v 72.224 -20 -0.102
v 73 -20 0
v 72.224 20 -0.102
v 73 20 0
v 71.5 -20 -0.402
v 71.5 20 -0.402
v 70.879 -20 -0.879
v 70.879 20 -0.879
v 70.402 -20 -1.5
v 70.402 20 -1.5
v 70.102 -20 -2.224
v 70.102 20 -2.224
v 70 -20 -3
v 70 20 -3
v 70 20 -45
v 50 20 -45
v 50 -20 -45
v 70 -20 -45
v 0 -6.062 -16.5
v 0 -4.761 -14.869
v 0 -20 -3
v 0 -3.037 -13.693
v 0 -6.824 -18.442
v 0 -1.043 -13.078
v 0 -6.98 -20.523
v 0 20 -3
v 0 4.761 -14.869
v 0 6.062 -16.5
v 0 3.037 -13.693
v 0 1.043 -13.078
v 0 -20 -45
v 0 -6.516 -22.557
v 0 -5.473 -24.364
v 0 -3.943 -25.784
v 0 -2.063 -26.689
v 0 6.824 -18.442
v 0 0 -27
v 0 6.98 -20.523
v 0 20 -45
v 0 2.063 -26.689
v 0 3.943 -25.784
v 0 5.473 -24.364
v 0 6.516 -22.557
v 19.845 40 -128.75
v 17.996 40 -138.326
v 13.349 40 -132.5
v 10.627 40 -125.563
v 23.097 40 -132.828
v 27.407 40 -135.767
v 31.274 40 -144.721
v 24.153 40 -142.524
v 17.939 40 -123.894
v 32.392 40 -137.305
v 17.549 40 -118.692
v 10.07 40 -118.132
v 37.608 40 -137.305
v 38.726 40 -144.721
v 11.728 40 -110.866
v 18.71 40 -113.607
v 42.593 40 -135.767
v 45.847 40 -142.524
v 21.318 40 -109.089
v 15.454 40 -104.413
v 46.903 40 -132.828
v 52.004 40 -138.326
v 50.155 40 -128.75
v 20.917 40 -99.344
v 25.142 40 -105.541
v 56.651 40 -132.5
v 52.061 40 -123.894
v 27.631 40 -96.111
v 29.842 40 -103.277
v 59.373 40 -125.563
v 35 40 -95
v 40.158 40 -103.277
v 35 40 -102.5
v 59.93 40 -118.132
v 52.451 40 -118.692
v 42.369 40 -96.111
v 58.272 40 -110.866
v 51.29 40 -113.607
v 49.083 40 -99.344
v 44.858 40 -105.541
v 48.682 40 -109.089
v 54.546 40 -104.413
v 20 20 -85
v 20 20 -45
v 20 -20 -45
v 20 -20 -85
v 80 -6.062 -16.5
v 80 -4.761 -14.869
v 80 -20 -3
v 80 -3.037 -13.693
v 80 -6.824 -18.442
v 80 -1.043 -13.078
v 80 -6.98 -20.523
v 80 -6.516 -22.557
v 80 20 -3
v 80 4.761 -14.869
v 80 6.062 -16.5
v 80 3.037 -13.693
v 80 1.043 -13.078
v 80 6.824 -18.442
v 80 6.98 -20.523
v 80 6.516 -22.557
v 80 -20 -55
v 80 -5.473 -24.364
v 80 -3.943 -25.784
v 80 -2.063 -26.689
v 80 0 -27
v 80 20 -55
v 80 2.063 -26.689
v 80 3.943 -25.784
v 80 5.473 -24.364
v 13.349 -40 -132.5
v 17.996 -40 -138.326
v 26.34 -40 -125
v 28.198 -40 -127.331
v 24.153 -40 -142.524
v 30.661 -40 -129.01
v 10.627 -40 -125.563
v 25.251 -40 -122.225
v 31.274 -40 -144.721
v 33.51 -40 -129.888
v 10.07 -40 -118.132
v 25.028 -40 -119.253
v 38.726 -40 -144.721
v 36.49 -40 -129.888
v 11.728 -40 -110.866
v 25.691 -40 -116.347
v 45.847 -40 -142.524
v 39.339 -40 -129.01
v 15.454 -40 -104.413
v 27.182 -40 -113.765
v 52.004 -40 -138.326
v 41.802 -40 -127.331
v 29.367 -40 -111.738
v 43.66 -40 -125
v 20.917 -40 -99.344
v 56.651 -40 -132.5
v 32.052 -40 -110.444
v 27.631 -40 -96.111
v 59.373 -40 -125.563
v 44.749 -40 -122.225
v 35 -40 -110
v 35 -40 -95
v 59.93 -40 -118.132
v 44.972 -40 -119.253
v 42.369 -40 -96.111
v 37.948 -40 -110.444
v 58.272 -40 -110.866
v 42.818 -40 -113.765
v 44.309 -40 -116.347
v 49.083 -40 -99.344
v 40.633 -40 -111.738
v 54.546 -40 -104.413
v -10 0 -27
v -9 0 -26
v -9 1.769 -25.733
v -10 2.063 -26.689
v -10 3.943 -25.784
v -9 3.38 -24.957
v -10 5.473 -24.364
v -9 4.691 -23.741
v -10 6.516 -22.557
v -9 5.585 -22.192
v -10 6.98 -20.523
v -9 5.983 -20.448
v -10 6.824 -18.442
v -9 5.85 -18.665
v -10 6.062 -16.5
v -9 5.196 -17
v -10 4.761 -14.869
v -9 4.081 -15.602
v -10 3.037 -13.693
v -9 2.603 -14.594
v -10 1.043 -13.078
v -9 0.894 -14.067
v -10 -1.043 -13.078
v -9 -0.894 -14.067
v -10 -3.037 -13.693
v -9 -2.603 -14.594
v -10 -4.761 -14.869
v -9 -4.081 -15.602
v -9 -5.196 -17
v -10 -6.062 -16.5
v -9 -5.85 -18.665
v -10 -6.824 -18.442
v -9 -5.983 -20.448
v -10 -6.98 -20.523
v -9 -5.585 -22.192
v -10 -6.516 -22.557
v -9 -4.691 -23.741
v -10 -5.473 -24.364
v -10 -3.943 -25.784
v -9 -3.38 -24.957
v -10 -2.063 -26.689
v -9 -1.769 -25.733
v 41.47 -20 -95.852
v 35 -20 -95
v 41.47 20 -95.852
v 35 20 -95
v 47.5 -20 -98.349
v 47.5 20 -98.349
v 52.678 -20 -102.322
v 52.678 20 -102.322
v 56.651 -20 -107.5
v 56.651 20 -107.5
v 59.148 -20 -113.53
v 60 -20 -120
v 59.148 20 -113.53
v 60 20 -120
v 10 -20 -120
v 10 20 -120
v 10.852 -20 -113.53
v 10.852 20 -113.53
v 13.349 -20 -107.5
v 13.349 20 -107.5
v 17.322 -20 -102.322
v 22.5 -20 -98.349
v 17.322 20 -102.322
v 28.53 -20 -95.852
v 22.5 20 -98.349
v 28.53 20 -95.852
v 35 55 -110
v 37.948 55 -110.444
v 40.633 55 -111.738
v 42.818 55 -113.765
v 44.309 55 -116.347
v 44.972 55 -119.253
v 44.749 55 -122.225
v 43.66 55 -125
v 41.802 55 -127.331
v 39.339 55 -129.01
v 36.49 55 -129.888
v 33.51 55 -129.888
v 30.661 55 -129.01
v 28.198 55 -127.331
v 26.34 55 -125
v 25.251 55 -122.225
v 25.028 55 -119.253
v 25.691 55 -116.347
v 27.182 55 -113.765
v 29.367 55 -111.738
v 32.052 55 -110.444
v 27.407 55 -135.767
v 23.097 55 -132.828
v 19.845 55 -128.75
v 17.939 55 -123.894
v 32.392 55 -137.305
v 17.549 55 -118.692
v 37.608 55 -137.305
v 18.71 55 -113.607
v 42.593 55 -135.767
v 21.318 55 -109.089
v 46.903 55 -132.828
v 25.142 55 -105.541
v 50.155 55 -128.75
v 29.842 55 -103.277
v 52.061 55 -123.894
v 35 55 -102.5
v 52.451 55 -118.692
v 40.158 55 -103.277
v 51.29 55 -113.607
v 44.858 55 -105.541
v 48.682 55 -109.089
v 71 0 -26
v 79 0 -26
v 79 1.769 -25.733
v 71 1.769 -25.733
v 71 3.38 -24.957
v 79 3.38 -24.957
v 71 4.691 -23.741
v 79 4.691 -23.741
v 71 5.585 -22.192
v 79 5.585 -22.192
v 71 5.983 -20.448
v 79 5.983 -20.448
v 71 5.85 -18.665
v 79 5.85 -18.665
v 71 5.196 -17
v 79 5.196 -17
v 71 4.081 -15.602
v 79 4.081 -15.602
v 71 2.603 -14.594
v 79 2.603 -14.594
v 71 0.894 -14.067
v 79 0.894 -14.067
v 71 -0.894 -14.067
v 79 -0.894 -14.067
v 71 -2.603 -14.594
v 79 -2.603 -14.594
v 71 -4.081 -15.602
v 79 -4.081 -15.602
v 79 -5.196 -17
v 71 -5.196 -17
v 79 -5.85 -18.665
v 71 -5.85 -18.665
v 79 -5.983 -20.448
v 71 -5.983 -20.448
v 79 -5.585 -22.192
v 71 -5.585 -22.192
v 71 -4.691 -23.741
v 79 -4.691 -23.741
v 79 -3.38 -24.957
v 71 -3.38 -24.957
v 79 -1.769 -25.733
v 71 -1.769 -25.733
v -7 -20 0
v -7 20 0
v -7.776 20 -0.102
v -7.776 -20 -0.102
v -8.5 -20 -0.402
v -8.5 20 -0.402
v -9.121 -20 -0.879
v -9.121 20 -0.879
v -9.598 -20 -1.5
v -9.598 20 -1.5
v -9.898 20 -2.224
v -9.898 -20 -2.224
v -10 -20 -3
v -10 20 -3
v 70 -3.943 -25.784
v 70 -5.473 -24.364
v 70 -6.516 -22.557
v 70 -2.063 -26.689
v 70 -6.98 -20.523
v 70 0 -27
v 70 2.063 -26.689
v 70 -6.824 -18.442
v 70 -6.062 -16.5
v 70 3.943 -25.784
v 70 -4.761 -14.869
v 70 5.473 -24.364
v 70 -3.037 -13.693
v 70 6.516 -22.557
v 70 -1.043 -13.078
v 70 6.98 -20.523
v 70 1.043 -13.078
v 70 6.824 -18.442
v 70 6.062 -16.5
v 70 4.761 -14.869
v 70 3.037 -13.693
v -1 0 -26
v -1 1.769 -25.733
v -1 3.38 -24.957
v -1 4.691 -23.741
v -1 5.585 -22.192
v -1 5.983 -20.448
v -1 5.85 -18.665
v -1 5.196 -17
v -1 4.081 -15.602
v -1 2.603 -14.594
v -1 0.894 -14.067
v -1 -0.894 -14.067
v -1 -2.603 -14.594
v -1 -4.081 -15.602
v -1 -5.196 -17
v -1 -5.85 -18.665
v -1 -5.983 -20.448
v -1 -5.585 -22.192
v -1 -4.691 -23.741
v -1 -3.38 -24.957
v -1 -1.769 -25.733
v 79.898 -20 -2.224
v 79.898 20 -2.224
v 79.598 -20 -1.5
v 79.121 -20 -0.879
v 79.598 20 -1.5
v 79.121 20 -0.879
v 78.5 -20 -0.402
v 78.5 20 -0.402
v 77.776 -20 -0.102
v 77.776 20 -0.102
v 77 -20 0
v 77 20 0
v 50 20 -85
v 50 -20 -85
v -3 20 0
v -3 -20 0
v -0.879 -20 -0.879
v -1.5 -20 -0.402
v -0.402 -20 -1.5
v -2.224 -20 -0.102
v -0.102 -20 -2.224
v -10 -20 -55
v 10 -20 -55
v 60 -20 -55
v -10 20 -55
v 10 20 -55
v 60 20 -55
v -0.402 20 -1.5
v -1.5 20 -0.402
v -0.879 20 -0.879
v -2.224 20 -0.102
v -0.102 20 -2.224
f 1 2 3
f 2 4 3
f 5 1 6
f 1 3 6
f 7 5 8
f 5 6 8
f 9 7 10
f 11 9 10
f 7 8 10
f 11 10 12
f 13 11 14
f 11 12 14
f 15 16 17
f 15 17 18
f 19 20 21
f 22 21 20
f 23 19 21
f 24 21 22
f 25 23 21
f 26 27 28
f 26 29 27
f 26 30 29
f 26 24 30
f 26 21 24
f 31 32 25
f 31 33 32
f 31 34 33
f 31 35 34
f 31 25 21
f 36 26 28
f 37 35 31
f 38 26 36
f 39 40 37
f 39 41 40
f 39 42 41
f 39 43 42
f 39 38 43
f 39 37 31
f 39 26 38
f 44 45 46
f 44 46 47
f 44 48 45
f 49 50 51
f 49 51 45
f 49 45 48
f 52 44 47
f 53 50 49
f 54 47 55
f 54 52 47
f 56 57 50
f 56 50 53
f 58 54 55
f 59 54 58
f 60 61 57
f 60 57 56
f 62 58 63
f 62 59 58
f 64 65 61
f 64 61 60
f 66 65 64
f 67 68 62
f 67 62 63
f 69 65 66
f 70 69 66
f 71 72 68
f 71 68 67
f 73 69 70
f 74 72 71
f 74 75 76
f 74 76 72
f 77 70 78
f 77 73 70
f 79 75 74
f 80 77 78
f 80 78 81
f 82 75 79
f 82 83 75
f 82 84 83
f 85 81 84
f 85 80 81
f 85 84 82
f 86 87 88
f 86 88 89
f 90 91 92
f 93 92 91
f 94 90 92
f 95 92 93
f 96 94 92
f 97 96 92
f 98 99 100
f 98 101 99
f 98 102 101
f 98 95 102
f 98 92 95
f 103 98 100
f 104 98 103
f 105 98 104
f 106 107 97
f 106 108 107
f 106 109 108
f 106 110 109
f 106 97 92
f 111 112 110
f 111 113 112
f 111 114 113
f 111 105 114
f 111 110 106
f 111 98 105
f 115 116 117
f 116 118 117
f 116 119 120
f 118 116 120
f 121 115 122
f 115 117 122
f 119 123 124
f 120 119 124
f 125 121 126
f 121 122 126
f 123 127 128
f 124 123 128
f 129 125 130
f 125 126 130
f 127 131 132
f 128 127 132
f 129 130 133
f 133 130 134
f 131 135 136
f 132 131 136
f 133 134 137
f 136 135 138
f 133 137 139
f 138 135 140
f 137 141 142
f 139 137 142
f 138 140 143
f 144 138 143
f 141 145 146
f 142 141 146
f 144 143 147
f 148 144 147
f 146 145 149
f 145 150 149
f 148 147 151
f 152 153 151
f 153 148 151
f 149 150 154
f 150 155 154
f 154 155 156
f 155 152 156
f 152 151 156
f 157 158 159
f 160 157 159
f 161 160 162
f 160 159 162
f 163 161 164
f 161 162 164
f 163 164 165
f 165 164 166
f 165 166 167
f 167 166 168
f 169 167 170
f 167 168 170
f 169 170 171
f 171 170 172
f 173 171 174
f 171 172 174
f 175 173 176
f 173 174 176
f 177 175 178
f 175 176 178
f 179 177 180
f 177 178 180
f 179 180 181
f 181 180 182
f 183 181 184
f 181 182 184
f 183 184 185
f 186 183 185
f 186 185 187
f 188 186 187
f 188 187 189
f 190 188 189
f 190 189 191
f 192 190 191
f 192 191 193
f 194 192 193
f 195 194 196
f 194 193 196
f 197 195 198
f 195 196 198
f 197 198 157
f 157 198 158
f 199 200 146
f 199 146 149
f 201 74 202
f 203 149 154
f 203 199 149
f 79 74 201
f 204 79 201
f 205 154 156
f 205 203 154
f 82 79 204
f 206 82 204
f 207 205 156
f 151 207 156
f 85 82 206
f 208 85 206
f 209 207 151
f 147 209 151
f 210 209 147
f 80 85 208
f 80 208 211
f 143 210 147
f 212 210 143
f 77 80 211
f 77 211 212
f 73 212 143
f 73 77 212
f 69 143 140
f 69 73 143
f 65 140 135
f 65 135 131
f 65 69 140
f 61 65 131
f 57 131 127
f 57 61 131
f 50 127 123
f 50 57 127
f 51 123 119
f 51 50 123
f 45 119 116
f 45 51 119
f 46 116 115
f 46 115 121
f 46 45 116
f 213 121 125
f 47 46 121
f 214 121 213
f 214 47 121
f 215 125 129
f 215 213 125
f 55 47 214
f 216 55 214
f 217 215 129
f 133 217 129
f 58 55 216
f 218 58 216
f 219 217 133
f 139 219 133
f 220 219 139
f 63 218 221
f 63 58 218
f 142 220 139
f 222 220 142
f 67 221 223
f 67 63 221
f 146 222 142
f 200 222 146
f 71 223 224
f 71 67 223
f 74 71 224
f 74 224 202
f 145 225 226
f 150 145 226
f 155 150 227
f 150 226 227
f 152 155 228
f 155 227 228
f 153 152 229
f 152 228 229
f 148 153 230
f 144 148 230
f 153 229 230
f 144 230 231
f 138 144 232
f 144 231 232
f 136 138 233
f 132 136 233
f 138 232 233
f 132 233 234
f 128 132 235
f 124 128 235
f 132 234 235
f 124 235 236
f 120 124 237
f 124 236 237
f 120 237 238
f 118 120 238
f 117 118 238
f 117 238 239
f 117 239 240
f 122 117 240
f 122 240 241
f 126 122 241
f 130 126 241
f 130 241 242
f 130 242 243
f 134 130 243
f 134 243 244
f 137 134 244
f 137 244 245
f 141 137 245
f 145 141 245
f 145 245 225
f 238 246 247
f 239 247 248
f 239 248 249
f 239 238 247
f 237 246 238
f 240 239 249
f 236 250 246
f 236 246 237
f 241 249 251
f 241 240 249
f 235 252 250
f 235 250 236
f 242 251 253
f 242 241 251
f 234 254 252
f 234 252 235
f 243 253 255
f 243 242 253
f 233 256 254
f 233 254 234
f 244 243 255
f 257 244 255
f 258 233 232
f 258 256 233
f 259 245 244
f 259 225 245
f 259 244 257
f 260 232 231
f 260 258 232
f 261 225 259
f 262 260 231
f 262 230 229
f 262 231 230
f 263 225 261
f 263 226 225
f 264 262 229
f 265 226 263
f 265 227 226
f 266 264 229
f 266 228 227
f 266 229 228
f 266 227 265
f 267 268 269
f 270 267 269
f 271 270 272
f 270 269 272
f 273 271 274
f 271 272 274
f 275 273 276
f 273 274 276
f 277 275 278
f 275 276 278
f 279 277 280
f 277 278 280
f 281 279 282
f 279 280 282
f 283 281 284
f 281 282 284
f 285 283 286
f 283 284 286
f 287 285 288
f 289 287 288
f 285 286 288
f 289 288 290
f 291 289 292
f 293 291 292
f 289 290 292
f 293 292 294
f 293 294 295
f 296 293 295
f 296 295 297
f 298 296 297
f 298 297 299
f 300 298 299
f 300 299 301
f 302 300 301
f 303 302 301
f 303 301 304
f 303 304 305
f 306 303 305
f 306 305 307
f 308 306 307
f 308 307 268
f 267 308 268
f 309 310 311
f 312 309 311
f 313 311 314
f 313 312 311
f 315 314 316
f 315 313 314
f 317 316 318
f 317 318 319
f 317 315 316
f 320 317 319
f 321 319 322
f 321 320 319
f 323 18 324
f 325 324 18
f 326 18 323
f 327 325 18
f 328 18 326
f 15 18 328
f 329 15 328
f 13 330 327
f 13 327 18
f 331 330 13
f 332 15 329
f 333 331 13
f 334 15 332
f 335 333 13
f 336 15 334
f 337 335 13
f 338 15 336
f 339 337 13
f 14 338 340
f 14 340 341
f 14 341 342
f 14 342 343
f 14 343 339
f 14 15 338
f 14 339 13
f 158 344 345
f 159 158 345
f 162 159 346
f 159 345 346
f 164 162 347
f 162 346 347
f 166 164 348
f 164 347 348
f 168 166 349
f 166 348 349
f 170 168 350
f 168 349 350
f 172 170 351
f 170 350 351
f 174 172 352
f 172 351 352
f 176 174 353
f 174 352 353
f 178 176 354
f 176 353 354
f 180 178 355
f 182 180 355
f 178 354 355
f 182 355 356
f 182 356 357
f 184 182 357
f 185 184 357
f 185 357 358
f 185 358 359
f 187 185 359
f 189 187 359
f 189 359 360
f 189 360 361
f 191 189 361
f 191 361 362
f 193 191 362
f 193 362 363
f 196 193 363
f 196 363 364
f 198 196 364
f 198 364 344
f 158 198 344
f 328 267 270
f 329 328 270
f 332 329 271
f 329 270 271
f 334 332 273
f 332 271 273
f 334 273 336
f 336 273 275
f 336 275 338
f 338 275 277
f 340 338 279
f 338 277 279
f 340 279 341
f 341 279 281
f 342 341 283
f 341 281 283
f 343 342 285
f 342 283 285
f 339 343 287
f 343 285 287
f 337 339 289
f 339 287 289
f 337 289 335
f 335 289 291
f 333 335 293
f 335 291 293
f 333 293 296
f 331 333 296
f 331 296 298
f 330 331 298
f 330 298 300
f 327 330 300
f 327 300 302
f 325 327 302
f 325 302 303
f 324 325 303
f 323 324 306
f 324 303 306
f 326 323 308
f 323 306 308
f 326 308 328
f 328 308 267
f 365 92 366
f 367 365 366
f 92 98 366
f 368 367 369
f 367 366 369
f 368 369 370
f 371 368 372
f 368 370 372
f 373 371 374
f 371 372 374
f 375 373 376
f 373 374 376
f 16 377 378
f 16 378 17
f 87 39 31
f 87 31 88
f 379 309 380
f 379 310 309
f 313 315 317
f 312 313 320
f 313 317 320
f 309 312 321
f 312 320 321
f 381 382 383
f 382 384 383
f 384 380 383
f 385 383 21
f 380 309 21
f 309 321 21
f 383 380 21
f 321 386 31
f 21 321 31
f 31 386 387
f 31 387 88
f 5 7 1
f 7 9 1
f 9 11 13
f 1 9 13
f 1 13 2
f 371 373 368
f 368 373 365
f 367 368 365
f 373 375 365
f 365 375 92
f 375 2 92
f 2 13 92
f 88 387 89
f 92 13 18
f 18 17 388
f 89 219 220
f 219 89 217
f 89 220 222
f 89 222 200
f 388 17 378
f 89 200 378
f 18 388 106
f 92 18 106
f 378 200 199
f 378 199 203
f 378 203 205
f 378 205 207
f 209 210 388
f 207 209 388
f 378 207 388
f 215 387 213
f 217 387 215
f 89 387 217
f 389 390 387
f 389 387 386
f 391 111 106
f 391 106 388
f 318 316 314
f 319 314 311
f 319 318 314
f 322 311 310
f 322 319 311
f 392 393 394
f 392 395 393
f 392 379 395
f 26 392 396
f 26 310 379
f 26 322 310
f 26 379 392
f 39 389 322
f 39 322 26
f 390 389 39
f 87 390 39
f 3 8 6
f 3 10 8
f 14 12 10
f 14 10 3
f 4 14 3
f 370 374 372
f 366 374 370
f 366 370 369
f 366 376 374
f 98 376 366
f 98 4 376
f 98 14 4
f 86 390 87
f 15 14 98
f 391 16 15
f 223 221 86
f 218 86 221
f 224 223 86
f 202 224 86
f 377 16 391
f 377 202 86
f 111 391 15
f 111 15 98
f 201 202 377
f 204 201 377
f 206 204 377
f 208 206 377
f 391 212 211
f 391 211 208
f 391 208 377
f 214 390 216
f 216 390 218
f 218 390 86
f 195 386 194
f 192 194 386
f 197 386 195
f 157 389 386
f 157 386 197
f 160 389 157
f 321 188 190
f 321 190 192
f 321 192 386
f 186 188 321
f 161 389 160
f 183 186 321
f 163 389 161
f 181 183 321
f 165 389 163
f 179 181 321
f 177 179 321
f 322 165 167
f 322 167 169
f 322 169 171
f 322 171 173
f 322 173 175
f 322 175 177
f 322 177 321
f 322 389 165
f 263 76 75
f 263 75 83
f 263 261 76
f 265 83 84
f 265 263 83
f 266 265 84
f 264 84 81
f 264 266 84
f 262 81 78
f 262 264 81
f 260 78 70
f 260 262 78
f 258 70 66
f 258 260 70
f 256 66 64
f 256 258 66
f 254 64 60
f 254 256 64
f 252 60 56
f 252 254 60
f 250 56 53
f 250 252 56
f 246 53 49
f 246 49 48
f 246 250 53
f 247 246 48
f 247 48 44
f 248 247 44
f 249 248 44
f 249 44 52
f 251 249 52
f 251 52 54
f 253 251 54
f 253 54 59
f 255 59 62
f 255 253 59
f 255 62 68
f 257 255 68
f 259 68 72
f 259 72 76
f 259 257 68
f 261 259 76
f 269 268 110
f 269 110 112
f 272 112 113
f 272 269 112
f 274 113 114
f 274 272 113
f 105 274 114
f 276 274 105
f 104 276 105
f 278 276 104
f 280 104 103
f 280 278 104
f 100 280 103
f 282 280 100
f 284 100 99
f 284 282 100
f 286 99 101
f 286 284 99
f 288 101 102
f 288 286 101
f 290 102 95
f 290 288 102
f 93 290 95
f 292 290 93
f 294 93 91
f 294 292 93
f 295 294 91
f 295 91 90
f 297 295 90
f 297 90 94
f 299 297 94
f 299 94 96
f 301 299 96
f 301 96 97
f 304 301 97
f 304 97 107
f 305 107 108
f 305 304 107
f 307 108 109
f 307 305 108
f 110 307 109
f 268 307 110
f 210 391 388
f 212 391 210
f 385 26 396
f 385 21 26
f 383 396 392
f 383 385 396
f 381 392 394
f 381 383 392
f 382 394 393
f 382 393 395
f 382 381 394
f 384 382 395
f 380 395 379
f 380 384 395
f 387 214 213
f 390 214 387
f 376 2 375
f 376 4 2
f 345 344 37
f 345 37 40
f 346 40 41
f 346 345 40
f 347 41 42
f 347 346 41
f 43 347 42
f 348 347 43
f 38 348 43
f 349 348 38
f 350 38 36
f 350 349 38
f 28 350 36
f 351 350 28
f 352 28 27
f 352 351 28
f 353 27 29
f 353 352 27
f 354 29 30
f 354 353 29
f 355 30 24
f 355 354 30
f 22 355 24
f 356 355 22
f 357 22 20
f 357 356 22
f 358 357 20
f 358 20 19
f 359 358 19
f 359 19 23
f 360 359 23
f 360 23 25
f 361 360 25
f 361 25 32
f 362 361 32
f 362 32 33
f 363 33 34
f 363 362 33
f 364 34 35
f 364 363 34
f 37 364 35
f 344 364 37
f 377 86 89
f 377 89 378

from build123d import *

# Parameters (mm, degrees)
BOSS_EXTRUDE2_DEPTH = 20
FILLET10_R          = 3
SKETCH2_R           = 6
CUT_EXTRUDE1_DEPTH  = 152.327459504
SKETCH3_R           = 25
BOSS_EXTRUDE6_DEPTH = 40
SKETCH5_R           = 17.5
BOSS_EXTRUDE7_DEPTH = 15
SKETCH6_R           = 10
CUT_EXTRUDE2_DEPTH  = 191.91883092
CHAMFER1_SIZE       = 1


with BuildPart() as part:
    # Sketch1 → Boss-Extrude2 (new, symmetric)
    with BuildSketch(Plane(origin=(0, 0, 0), x_dir=(1, 0, 0), z_dir=(0, 1, 0))):
        Polygon((0, 0), (0, 45), (20, 45), (20, 85), (50, 85), (50, 45), (70, 45), (70, 0), (80, 0), (80, 55), (60, 55), (60, 120), (10, 120), (10, 55), (-10, 55), (-10, 0), align=None)
    extrude(amount=BOSS_EXTRUDE2_DEPTH, both=True)

    # Fillet10
    fillet10_edges = [part.edges().sort_by_distance(p)[0] for p in [
        (-10, 0, 0),
        (80, 0, 0),
        (70, 0, 0),
        (0, 0, 0),
    ]]
    fillet(fillet10_edges, radius=FILLET10_R)

    # Sketch2 → Cut-Extrude1 (cut, through all)
    with BuildSketch(Plane(origin=(80, 0, 0), x_dir=(0, 0, -1), z_dir=(1, 0, 0))):
        with Locations((20, 0)):
            Circle(SKETCH2_R)
    extrude(amount=-CUT_EXTRUDE1_DEPTH, mode=Mode.SUBTRACT)

    # Sketch3 → Boss-Extrude6 (add, symmetric)
    with BuildSketch(Plane(origin=(0, 0, 0), x_dir=(1, 0, 0), z_dir=(0, 1, 0))):
        with Locations(Location((35, 120, 0), (0, 0, 270))):
            Circle(SKETCH3_R)
    extrude(amount=BOSS_EXTRUDE6_DEPTH, both=True)

    # Sketch5 → Boss-Extrude7 (add, symmetric)
    with BuildSketch(Plane(origin=(0, 40, 0), x_dir=(1, 0, 0), z_dir=(0, 1, 0))):
        with Locations(Location((35, 120, 0), (0, 0, 270))):
            Circle(SKETCH5_R)
    extrude(amount=BOSS_EXTRUDE7_DEPTH, both=True)

    # Sketch6 → Cut-Extrude2 (cut, through all)
    with BuildSketch(Plane(origin=(0, 55, 0), x_dir=(1, 0, 0), z_dir=(0, 1, 0))):
        with Locations(Location((35, 120, 0), (0, 0, 270))):
            Circle(SKETCH6_R)
    extrude(amount=-CUT_EXTRUDE2_DEPTH, mode=Mode.SUBTRACT)

    # Chamfer1
    chamfer1_edges = [part.edges().sort_by_distance(p)[0] for p in [
        (-10, 0, -14),
        (0, 0, -14),
        (70, 0, -14),
        (80, 0, -14),
    ]]
    chamfer(chamfer1_edges, length=CHAMFER1_SIZE)


solid = part.part
